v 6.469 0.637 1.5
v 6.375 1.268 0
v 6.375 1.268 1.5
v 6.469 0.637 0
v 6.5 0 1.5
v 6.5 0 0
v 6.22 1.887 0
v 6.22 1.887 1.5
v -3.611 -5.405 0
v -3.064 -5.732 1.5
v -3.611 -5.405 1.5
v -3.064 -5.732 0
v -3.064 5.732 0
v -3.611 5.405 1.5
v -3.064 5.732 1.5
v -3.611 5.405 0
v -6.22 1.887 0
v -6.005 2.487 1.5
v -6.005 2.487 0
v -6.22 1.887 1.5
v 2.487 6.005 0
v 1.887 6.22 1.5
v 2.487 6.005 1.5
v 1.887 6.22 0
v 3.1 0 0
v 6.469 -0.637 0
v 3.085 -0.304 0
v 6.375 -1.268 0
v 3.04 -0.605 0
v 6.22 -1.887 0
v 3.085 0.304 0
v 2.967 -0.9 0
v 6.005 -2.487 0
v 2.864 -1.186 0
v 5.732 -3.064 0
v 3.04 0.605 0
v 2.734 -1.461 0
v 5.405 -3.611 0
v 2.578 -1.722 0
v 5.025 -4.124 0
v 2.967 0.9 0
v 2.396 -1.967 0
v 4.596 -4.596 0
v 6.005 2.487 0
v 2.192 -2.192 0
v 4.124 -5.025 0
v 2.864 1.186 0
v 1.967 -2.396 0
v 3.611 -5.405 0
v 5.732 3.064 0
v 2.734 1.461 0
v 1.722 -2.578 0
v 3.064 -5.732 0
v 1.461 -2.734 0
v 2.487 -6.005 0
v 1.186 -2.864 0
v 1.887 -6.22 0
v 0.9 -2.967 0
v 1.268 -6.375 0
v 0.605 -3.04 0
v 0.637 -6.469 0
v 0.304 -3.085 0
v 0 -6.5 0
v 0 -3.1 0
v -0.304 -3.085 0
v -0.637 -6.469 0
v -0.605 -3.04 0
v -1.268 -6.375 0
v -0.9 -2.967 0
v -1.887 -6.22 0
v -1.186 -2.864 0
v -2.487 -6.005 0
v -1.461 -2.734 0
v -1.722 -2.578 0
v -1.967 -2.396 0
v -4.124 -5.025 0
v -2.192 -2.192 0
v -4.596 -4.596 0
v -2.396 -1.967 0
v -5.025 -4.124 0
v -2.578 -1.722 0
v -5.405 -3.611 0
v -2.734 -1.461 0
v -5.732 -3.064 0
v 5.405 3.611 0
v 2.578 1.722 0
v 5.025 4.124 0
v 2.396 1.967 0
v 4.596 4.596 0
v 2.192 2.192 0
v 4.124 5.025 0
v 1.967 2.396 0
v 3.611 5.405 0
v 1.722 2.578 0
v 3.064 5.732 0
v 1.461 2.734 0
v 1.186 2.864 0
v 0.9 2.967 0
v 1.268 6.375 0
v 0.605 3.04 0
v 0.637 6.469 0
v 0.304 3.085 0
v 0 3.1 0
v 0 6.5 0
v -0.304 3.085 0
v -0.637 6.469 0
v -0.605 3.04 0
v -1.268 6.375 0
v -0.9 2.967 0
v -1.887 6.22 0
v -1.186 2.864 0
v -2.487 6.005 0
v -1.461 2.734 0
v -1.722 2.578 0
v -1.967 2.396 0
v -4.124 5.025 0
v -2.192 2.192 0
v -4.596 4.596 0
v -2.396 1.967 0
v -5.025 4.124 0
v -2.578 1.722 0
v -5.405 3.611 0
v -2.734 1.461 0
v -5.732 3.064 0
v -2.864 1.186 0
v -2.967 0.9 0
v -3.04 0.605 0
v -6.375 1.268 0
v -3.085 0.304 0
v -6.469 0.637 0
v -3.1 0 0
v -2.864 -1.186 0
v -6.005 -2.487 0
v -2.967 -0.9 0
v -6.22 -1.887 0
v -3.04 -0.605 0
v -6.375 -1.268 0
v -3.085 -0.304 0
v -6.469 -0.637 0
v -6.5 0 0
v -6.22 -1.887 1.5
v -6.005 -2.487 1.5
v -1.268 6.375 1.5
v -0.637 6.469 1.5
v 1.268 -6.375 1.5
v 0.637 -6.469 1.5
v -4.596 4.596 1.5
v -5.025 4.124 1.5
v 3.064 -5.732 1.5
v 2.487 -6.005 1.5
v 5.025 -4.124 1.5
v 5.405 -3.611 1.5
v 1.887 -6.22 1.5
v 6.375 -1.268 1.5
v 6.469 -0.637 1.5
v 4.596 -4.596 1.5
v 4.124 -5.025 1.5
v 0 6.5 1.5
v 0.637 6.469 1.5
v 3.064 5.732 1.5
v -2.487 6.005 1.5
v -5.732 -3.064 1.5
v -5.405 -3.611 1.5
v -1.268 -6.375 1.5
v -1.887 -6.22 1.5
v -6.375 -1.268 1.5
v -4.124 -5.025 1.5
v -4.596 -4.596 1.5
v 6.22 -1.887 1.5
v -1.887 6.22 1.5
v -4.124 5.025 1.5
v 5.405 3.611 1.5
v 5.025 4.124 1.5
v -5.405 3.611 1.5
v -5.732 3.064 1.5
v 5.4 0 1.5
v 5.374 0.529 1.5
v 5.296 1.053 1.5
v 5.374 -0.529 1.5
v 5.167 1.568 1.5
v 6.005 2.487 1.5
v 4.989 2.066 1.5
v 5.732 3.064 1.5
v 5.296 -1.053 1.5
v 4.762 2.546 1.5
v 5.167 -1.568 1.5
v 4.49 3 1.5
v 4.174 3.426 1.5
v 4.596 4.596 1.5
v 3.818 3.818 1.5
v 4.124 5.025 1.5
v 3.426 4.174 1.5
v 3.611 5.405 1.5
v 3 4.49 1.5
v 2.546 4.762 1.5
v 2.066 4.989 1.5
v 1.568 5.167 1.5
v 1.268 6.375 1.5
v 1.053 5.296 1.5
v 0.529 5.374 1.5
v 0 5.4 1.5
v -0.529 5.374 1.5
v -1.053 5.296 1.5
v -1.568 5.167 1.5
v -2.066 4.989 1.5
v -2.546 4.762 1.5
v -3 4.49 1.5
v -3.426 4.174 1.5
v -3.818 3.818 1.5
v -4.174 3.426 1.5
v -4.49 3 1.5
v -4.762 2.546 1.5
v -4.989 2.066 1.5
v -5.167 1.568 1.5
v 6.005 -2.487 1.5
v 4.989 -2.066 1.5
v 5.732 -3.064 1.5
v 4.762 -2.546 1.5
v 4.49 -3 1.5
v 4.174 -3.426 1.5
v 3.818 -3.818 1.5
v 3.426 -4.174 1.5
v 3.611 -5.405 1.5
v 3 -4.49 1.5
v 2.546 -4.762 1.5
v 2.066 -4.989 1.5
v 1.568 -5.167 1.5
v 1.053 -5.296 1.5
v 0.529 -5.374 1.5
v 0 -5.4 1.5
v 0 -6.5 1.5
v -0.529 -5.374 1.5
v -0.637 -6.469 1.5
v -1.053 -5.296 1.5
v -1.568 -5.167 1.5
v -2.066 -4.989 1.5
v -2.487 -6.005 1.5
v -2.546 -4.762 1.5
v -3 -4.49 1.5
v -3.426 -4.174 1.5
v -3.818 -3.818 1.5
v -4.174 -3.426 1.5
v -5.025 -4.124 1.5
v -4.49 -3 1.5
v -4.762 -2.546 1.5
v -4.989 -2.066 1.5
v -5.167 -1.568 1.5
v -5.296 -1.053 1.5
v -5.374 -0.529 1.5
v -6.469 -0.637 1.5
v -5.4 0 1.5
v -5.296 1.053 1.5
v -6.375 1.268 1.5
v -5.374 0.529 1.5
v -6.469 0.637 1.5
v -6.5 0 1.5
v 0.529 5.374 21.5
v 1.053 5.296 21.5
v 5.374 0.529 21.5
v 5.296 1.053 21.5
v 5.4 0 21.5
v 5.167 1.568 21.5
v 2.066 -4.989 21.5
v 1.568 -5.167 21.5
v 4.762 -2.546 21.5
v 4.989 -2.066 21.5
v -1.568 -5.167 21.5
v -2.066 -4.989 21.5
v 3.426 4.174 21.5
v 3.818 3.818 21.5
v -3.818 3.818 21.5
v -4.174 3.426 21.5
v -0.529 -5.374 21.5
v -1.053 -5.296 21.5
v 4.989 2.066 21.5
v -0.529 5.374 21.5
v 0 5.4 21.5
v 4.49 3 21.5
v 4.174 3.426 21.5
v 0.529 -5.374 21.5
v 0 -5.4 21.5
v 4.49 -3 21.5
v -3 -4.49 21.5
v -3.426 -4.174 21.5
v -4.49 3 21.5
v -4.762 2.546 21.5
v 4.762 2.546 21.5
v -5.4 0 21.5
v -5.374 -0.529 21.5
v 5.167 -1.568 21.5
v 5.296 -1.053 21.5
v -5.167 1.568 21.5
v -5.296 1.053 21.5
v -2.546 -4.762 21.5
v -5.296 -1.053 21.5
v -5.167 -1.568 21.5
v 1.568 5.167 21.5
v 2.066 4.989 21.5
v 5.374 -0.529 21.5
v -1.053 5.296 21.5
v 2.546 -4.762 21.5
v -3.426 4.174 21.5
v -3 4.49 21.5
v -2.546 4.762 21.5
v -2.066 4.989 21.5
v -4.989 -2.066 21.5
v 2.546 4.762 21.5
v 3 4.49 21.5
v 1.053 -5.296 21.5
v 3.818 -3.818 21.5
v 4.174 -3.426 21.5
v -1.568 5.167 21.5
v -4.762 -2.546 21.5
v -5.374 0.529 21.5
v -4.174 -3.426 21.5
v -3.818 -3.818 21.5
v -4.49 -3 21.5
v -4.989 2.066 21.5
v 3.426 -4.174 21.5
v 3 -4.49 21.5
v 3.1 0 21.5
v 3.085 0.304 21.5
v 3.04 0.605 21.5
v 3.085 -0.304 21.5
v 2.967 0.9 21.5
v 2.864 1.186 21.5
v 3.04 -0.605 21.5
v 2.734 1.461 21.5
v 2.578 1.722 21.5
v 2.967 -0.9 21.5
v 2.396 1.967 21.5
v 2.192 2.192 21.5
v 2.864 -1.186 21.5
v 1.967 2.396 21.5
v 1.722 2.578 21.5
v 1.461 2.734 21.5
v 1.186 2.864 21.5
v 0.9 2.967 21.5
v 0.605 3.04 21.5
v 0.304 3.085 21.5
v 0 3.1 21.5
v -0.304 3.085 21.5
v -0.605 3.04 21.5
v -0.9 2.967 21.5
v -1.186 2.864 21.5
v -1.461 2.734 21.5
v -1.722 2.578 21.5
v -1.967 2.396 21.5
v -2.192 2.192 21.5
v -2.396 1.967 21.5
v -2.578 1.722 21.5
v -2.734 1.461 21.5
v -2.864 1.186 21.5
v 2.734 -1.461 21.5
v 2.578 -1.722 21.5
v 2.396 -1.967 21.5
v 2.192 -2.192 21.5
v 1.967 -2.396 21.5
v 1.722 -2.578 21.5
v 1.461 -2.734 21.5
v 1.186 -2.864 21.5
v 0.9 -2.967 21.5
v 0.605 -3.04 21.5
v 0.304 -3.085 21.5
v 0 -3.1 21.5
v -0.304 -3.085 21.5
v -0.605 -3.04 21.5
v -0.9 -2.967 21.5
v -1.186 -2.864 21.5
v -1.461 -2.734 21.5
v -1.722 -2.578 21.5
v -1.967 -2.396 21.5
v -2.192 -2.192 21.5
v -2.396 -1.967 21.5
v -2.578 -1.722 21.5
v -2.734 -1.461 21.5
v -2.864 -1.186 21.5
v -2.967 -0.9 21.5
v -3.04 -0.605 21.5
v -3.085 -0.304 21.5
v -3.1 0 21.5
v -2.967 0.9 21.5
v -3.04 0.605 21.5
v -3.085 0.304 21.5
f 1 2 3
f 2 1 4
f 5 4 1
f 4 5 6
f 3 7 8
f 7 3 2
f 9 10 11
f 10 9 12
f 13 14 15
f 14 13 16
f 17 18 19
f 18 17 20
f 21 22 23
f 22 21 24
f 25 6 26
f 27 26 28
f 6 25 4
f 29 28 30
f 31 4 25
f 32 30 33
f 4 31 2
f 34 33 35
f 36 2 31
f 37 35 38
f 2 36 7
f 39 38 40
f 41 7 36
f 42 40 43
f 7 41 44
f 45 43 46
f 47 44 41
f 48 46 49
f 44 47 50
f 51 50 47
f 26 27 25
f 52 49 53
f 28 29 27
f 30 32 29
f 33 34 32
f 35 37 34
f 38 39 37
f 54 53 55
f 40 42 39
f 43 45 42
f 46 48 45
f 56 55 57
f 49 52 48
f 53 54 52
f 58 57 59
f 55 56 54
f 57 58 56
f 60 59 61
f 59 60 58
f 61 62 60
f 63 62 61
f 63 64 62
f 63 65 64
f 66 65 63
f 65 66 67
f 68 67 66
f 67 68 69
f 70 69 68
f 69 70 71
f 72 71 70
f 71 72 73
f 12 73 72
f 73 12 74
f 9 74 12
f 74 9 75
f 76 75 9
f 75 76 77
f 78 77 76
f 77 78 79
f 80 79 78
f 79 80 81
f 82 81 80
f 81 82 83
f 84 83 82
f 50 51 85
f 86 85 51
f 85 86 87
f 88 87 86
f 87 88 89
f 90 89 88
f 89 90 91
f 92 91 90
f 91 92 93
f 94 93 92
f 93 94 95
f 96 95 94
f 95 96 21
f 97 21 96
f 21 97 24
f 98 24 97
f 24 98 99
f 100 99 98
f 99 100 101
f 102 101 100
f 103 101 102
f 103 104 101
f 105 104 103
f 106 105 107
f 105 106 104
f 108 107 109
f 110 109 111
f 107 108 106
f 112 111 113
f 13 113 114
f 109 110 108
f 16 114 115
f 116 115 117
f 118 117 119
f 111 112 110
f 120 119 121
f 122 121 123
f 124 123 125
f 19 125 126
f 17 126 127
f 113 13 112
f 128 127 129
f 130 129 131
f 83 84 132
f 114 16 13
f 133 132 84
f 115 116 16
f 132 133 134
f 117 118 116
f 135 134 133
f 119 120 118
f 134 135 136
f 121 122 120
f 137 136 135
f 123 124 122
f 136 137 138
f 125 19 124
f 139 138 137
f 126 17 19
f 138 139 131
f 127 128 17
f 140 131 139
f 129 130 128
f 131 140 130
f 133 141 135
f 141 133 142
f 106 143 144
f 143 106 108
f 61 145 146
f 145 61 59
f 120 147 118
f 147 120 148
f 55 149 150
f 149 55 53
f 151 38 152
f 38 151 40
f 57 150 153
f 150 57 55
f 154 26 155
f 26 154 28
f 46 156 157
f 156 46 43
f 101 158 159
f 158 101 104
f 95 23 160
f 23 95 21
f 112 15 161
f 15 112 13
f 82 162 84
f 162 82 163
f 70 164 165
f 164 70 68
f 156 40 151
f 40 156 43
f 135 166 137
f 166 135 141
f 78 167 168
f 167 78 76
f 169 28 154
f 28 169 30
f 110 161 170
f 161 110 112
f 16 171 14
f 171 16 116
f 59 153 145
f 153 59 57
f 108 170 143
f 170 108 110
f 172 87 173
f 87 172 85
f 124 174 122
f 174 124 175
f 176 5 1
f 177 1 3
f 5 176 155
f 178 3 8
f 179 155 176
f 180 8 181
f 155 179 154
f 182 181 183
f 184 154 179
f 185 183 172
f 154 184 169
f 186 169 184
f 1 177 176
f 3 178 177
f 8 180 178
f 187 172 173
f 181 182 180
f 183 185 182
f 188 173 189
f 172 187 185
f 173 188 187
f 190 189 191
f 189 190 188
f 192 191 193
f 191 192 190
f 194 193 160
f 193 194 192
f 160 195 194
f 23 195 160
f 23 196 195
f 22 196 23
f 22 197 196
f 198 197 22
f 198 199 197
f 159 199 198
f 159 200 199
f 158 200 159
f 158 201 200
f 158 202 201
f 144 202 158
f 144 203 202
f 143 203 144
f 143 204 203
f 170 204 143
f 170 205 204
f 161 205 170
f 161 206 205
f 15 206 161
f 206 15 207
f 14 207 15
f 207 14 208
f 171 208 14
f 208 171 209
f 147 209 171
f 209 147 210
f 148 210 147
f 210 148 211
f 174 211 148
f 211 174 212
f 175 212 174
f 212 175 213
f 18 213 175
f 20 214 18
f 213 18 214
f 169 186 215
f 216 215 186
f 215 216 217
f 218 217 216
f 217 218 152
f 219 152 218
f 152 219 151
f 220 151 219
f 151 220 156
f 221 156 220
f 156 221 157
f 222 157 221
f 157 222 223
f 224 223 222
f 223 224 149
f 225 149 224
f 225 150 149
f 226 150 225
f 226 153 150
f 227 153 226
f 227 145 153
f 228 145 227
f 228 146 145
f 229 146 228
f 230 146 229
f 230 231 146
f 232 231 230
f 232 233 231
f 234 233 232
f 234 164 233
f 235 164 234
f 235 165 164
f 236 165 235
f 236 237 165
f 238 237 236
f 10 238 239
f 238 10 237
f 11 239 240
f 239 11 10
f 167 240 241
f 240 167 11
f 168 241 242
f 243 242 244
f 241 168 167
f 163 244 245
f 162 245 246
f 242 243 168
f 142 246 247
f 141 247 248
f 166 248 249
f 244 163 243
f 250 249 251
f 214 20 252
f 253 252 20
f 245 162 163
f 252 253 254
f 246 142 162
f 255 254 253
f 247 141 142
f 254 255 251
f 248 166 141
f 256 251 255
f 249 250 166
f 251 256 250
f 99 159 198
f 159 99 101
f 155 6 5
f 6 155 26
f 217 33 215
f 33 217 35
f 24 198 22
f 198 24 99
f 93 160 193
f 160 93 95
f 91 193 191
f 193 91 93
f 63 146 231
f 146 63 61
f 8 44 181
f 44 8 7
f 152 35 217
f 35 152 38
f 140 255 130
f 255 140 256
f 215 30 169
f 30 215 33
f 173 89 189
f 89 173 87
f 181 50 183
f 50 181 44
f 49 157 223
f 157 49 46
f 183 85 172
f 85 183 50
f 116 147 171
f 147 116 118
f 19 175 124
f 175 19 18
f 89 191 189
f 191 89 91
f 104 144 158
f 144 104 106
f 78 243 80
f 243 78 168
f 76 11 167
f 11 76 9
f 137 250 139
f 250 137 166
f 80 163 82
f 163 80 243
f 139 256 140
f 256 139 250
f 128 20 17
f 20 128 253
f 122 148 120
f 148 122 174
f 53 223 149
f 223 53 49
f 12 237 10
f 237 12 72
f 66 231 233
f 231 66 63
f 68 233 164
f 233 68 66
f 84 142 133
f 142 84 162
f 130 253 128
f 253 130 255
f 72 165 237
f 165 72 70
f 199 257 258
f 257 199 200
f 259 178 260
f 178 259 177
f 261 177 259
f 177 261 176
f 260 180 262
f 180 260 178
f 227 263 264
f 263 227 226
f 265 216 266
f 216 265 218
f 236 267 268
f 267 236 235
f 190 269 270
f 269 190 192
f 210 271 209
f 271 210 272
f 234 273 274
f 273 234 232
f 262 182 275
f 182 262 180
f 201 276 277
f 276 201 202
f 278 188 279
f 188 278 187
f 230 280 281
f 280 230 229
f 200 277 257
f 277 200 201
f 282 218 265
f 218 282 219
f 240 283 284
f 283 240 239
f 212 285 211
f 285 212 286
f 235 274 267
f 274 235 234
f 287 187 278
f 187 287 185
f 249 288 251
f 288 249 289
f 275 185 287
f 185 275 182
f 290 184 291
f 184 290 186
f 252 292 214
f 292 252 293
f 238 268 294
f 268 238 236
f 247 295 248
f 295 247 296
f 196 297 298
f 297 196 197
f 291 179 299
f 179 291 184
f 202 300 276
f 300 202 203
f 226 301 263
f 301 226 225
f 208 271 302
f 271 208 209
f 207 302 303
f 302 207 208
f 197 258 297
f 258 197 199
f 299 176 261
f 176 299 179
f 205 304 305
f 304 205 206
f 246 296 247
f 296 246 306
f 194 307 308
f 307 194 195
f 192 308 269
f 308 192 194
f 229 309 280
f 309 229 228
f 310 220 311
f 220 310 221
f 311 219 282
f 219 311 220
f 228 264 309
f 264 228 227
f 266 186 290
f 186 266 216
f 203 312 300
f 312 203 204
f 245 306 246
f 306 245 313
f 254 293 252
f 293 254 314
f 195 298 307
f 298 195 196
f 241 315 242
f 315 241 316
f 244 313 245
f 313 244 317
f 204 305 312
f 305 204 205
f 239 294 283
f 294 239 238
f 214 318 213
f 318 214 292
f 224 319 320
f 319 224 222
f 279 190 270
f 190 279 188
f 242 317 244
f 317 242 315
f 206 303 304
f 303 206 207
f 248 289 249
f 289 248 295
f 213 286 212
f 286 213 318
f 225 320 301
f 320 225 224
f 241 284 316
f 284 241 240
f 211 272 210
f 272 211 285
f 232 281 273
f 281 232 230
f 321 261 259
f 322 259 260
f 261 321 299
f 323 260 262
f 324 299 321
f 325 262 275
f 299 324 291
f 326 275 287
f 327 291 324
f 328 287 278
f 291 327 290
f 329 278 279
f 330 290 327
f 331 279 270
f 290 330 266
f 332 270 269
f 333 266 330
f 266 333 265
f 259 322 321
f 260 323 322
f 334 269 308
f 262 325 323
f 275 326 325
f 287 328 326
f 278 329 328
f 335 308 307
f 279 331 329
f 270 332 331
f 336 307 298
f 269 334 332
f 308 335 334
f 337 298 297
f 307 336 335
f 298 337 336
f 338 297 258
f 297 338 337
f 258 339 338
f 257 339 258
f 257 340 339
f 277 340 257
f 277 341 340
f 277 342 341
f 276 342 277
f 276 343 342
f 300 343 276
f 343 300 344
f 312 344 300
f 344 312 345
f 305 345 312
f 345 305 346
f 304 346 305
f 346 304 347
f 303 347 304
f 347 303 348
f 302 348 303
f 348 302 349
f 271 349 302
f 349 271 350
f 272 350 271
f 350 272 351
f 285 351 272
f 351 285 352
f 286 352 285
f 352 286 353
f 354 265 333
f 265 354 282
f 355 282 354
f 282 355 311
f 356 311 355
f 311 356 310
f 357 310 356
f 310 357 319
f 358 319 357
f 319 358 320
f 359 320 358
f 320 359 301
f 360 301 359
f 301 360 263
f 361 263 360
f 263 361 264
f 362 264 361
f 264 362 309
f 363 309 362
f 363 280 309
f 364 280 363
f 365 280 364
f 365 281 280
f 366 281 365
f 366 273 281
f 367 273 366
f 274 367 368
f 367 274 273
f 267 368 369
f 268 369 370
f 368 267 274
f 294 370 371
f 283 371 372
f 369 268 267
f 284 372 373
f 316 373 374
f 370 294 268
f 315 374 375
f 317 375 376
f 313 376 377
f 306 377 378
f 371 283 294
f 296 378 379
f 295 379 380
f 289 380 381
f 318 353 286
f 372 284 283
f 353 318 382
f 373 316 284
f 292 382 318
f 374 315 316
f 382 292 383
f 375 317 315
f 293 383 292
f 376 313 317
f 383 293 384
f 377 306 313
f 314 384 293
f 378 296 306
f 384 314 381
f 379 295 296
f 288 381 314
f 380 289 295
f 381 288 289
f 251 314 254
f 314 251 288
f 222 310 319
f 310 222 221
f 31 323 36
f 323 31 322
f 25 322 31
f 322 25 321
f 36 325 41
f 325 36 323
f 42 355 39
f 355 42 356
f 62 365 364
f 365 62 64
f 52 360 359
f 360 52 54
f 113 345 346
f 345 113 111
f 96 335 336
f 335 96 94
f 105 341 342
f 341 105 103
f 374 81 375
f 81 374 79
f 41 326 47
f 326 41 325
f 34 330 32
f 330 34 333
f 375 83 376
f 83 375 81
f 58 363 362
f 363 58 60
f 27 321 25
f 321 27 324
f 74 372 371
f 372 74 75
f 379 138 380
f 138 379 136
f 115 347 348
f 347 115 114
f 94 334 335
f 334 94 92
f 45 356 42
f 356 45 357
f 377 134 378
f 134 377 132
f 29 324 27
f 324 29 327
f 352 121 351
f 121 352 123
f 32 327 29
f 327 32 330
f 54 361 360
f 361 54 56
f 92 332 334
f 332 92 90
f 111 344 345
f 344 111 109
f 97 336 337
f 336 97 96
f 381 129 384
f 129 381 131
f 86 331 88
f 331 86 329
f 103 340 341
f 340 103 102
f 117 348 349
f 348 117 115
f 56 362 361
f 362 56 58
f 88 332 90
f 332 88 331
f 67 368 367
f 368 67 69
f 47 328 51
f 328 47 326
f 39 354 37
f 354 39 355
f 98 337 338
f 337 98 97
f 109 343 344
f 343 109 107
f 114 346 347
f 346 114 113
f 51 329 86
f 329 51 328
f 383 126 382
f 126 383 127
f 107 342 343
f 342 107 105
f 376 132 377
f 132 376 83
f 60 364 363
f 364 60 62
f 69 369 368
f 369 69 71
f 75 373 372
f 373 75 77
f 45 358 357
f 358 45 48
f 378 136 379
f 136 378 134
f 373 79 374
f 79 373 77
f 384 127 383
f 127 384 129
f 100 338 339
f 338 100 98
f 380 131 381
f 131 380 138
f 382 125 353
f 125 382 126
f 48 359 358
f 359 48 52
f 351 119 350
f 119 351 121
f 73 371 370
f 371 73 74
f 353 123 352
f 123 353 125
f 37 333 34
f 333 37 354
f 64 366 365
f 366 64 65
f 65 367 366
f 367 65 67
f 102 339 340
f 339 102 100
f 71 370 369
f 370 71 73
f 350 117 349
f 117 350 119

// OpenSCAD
// Adapter sleeve: 0.2 mL PCR tube into a 1.5 mL tube rack hole
// Print orientation: collar (13 mm dia, 1.5 mm thick) on the bed (z = 0..1.5),
// sleeve body (10.8 mm OD) rising to z = 21.5, with a 6.2 mm bore through the full height.

// --- Dimensions (mm) ---
collar_dia   = 13.0;   // outer diameter of the bed-lying collar
collar_thk   = 1.5;    // thickness of the collar (z = 0 to 1.5)
body_od      = 10.8;   // outer diameter of the sleeve body
body_top_z   = 21.5;   // top of the sleeve body (z = 21.5)
bore_dia     = 6.2;    // straight through-bore diameter

// --- Derived radii ---
collar_r = collar_dia / 2;   // 6.5
body_r   = body_od   / 2;    // 5.4
bore_r   = bore_dia  / 2;    // 3.1

// --- Curvature resolution ---
$fn = 64;

// --- Single solid: collar + body, with the 6.2 mm bore cut through the full height ---
// The cutter extends 1 mm past each face (z = -1 to 22.5) so no faces are coplanar.
difference() {
    union() {
        // Collar: 13 mm diameter, 1.5 mm thick, lying on the bed
        cylinder(h = collar_thk, d = collar_dia, $fn = $fn);

        // Sleeve body: 10.8 mm outer diameter, rising from the collar to z = 21.5
        cylinder(h = body_top_z, d = body_od, $fn = $fn);
    }

    // Straight 6.2 mm bore, open at both ends
    translate([0, 0, -1])
        cylinder(h = body_top_z + 2, d = bore_dia, $fn = $fn);
}
